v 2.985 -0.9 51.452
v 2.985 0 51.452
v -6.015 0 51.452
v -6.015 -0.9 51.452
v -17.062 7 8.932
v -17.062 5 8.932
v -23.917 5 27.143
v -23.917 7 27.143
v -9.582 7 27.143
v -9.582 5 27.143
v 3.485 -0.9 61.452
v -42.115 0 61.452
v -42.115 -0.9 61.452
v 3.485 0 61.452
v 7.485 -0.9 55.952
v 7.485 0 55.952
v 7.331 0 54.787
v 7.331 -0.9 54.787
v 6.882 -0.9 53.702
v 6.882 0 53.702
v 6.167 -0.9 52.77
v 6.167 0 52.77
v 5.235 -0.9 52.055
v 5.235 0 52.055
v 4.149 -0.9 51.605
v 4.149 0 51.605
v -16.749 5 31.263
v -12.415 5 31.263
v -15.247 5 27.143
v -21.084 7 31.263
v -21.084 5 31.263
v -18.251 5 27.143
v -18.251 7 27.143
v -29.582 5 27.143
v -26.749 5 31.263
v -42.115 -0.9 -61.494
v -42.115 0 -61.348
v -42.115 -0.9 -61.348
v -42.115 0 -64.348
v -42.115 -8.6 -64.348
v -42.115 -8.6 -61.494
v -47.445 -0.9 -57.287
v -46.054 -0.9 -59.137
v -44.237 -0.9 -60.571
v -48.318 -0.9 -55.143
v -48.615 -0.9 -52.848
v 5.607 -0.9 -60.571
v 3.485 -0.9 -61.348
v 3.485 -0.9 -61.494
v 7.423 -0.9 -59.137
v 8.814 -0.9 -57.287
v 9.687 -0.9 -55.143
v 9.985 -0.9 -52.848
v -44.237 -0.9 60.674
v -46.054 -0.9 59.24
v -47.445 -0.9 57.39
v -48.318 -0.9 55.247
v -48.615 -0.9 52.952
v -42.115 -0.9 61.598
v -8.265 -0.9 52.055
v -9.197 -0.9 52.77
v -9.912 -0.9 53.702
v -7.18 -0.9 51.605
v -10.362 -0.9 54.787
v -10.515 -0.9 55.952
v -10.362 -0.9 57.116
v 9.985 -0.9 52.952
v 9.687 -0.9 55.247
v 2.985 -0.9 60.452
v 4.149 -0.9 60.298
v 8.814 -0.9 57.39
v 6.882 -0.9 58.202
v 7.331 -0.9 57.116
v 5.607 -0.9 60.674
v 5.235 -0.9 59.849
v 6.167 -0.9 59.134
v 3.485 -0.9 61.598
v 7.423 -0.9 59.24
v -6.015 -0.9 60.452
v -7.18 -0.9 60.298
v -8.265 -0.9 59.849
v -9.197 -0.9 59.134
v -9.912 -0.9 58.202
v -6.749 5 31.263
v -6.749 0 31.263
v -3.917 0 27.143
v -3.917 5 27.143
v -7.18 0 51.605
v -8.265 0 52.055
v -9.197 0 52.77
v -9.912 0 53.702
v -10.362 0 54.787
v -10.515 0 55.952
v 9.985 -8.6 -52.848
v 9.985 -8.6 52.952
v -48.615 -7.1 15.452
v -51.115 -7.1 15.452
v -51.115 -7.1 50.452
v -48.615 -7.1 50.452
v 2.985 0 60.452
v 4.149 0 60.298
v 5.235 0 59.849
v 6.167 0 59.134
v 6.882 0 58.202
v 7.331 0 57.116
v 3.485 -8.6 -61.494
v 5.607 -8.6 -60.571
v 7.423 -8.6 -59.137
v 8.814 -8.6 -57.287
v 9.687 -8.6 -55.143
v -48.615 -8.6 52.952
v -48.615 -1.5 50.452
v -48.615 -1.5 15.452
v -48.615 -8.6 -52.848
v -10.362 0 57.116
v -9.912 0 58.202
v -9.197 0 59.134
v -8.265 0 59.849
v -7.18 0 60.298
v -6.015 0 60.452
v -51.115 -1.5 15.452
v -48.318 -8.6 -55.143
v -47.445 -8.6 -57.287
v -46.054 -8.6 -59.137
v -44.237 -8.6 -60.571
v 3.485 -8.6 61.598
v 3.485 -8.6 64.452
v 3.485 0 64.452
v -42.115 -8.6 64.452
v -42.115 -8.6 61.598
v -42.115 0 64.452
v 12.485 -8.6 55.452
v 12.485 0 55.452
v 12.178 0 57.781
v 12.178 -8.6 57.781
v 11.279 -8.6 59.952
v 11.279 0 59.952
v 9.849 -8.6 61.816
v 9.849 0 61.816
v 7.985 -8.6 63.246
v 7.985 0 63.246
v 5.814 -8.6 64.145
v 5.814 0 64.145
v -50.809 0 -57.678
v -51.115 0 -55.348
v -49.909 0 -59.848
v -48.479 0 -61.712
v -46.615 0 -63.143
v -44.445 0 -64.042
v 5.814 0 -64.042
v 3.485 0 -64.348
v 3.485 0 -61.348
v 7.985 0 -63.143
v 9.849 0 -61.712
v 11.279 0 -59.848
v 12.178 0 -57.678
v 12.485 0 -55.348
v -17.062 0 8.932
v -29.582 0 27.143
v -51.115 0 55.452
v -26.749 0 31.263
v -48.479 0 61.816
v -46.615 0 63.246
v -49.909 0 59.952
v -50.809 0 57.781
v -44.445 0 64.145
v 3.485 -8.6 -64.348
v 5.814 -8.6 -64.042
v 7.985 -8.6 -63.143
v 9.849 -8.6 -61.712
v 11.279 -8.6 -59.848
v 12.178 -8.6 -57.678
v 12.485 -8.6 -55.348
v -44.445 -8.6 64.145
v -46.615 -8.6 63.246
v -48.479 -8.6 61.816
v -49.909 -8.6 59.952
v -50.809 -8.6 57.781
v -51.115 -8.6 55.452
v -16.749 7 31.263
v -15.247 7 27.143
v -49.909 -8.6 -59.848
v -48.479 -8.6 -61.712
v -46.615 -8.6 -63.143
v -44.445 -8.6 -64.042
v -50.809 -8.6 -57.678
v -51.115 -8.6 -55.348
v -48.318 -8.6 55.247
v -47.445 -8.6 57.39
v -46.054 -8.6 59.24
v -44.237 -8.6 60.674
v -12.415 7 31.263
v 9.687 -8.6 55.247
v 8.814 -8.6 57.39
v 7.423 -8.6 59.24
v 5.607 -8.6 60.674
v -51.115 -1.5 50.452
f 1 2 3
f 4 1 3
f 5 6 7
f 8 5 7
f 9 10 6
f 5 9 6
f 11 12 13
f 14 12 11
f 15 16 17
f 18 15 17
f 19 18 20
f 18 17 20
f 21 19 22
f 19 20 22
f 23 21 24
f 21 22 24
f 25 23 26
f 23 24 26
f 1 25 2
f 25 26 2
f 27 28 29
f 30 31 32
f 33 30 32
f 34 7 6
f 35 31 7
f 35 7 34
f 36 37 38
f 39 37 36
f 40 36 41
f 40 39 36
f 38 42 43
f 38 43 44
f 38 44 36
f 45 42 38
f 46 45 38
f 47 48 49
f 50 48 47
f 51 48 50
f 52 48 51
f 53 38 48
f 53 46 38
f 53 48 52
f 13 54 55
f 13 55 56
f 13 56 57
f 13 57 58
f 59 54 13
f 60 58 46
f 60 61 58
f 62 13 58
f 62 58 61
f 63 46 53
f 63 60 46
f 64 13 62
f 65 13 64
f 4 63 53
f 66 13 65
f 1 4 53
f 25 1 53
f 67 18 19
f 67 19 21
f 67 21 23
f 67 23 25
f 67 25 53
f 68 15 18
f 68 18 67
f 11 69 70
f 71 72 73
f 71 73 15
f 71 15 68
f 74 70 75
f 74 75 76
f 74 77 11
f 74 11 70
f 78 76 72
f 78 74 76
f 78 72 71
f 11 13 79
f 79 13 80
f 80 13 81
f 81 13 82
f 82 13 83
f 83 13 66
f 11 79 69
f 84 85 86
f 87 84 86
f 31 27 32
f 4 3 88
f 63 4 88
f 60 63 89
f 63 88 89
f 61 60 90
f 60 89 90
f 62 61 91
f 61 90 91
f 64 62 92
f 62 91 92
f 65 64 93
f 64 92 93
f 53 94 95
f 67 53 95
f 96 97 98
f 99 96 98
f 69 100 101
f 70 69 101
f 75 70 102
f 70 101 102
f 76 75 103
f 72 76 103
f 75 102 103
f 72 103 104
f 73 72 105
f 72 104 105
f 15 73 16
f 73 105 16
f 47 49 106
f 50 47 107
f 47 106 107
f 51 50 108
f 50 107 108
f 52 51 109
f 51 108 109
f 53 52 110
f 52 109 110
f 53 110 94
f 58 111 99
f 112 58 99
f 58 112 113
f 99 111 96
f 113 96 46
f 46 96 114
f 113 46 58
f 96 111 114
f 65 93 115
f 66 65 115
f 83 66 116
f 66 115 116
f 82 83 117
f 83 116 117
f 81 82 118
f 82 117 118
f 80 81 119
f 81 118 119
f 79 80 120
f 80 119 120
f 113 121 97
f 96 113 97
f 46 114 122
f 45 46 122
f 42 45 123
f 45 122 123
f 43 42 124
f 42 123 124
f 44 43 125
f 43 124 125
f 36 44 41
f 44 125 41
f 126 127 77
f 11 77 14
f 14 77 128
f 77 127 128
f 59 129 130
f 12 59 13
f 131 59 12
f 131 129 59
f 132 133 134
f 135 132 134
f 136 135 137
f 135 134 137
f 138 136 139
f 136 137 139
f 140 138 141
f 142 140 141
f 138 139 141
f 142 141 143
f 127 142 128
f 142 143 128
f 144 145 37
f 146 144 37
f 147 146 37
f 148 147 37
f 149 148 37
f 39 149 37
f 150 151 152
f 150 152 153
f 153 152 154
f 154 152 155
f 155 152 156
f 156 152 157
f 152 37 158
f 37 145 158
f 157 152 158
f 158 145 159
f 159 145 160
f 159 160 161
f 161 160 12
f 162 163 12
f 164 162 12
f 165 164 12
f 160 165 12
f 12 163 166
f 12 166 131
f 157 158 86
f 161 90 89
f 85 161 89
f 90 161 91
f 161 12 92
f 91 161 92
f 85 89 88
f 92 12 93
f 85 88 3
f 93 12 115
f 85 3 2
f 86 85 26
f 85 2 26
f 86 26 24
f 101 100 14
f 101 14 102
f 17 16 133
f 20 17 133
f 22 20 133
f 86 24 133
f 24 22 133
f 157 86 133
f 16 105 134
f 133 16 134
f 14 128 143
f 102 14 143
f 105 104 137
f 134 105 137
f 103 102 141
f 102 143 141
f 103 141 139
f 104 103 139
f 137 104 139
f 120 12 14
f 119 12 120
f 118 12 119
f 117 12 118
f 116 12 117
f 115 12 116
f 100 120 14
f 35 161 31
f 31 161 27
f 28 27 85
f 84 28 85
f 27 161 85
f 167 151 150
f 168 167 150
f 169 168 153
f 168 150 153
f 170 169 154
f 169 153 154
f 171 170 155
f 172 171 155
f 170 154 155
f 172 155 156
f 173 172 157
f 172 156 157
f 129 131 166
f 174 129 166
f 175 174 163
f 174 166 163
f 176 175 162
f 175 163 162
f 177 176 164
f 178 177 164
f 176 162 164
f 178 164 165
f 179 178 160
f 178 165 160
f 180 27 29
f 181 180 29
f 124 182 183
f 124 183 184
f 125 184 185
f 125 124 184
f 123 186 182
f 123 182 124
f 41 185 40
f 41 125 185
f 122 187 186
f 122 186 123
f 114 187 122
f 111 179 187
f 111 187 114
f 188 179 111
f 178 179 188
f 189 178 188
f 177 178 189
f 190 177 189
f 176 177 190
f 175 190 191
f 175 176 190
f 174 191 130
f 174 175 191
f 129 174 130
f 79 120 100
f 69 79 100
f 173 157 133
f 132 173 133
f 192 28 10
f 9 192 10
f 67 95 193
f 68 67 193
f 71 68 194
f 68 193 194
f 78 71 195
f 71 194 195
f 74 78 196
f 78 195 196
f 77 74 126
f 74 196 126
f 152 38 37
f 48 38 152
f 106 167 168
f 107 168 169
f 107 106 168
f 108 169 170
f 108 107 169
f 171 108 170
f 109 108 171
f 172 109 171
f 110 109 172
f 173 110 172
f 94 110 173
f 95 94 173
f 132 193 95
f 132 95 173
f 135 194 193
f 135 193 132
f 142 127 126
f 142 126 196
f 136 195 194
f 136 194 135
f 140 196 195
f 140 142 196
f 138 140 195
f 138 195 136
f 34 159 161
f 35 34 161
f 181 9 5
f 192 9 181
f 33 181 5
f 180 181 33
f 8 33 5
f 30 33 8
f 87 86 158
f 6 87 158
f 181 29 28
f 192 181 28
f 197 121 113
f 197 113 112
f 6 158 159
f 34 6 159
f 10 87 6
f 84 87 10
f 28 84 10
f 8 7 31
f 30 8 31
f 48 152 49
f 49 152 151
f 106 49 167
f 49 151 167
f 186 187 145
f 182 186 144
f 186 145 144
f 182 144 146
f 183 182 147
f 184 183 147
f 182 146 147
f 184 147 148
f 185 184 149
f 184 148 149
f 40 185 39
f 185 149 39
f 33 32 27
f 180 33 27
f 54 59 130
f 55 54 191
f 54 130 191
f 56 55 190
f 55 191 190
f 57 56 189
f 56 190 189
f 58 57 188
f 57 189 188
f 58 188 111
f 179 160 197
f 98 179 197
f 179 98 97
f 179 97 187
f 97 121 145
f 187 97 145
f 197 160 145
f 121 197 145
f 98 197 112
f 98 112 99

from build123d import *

# Parameters (mm, degrees)
F1_DEPTH  = 8.6
F3_DEPTH  = 7.7
F5_DEPTH  = 5
F6_W      = 45.6
F6_H      = 8.6
F7_DEPTH  = 3
F8_W      = 5.6
F8_H      = 35
F9_DEPTH  = 14.2
F10_W     = 45.6
F10_H     = 8.6
F11_DEPTH = 3
F13_DEPTH = 5
F15_DEPTH = 2


with BuildPart() as f1:
    # F0 (on Front) → F1 (new body)
    with BuildSketch(Plane.XZ):
        with BuildLine():
            Line((3.4848013847, 64.4517231077), (-42.1151986153, 64.4517231077))
            ThreePointArc((-42.1151986153, 64.4517231077), (-48.479159646, 61.8156841384), (-51.1151986153, 55.4517231077))
            Line((-51.1151986153, 55.4517231077), (-51.1151986153, -55.3482768923))
            ThreePointArc((-51.1151986153, -55.3482768923), (-48.479159646, -61.712237923), (-42.1151986153, -64.3482768923))
            Line((-42.1151986153, -64.3482768923), (3.4848013847, -64.3482768923))
            ThreePointArc((3.4848013847, -64.3482768923), (9.8487624154, -61.712237923), (12.4848013847, -55.3482768923))
            Line((12.4848013847, -55.3482768923), (12.4848013847, 55.4517231077))
            ThreePointArc((12.4848013847, 55.4517231077), (9.8487624154, 61.8156841384), (3.4848013847, 64.4517231077))
        make_face()
    extrude(amount=F1_DEPTH)

    # F2 (on face) → F3 (cut)
    with BuildSketch(Plane.XZ.offset(8.6)):
        with BuildLine():
            Line((0.9848013847, 61.9517231077), (-39.6151986153, 61.9517231077))
            ThreePointArc((-39.6151986153, 61.9517231077), (-45.979159646, 59.3156841384), (-48.6151986153, 52.9517231077))
            Line((-48.6151986153, 52.9517231077), (-48.6151986153, -52.8482768923))
            ThreePointArc((-48.6151986153, -52.8482768923), (-45.979159646, -59.212237923), (-39.6151986153, -61.8482768923))
            Line((-39.6151986153, -61.8482768923), (0.9848013847, -61.8482768923))
            ThreePointArc((0.9848013847, -61.8482768923), (7.3487624154, -59.212237923), (9.9848013847, -52.8482768923))
            Line((9.9848013847, -52.8482768923), (9.9848013847, 52.9517231077))
            ThreePointArc((9.9848013847, 52.9517231077), (7.3487624154, 59.3156841384), (0.9848013847, 61.9517231077))
        make_face()
    extrude(amount=-F3_DEPTH, mode=Mode.SUBTRACT)

    # F4 (on face) → F5 (cut)
    with BuildSketch(Plane(origin=(0, 0, 0), x_dir=(-1, 0, 0), z_dir=(0, 1, 0))):
        with BuildLine():
            Line((6.0151986153, 60.4517231077), (-2.9848013847, 60.4517231077))
            ThreePointArc((-2.9848013847, 60.4517231077), (-6.1667819, 59.133703623), (-7.4848013847, 55.9517231077))
            ThreePointArc((-7.4848013847, 55.9517231077), (-6.1667819, 52.7697425924), (-2.9848013847, 51.4517231077))
            Line((-2.9848013847, 51.4517231077), (6.0151986153, 51.4517231077))
            ThreePointArc((6.0151986153, 51.4517231077), (9.1971791307, 52.7697425924), (10.5151986153, 55.9517231077))
            ThreePointArc((10.5151986153, 55.9517231077), (9.1971791307, 59.133703623), (6.0151986153, 60.4517231077))
        make_face()
    extrude(amount=-F5_DEPTH, mode=Mode.SUBTRACT)

    # F6 (on face) → F7 (cut)
    with BuildSketch(Plane(origin=(0, 0, -64.3482768923), x_dir=(1, 0, 0), z_dir=(0, 0, -1))):
        with Locations((-19.3151986153, 4.3)):
            Rectangle(F6_W, F6_H)
    extrude(amount=-F7_DEPTH, mode=Mode.SUBTRACT)

    # F8 (on face) → F9 (cut)
    with BuildSketch(Plane(origin=(-51.1151986153, 0, 0), x_dir=(0, -1, 0), z_dir=(-1, 0, 0))):
        with Locations((4.3, 32.9517231077)):
            Rectangle(F8_W, F8_H)
    extrude(amount=-F9_DEPTH, mode=Mode.SUBTRACT)

    # F10 (on face) → F11 (cut)
    with BuildSketch(Plane.XY.offset(64.4517231077)):
        with Locations((-19.3151986153, -4.3)):
            Rectangle(F10_W, F10_H)
    extrude(amount=-F11_DEPTH, mode=Mode.SUBTRACT)

    # F12 (on face) → F13 (join)
    with BuildSketch(Plane(origin=(0, 0, 0), x_dir=(-1, 0, 0), z_dir=(0, 1, 0))):
        Polygon((10.6879380899, 31.2634583622), (6.749325754, 31.2634583622), (3.9166819364, 27.1432485372), (7.8552942723, 27.1432485372), align=None)
        Polygon((13.5205856233, 27.1432485372), (10.6879380899, 31.2634583622), (7.8552942723, 27.1432485372), align=None)
        Polygon((16.3532294408, 31.2634583622), (10.6879380899, 31.2634583622), (13.5205856233, 27.1432485372), align=None)
        Polygon((7.8552942723, 27.1432485372), (3.9166819364, 27.1432485372), (17.0616876136, 8.9319211103), align=None)
        Polygon((19.2072947722, 27.1432485372), (16.3532294408, 31.2634583622), (13.5205856233, 27.1432485372), align=None)
        Polygon((22.0399385898, 31.2634583622), (16.3532294408, 31.2634583622), (19.2072947722, 27.1432485372), align=None)
        Polygon((13.5205856233, 27.1432485372), (7.8552942723, 27.1432485372), (17.0616876136, 8.9319211103), align=None)
        Polygon((19.2072947722, 27.1432485372), (13.5205856233, 27.1432485372), (17.0616876136, 8.9319211103), align=None)
        Polygon((24.8940039212, 27.1432485372), (17.0616876136, 8.9319211103), (29.5819732873, 27.1432485372), align=None)
        Polygon((19.2072947722, 27.1432485372), (17.0616876136, 8.9319211103), (24.8940039212, 27.1432485372), align=None)
        Polygon((24.8940039212, 27.1432485372), (22.0399385898, 31.2634583622), (19.2072947722, 27.1432485372), align=None)
        Polygon((26.749325754, 31.2634583622), (22.0399385898, 31.2634583622), (24.8940039212, 27.1432485372), (29.5819732873, 27.1432485372), align=None)
    extrude(amount=F13_DEPTH)

    # F14 (on face) → F15 (join)
    with BuildSketch(Plane(origin=(0, 5, 0), x_dir=(-1, 0, 0), z_dir=(0, 1, 0))):
        Polygon((12.4146133892, 31.2634583622), (9.5819695716, 27.1432485372), (15.2472572067, 27.1432485372), align=None)
        Polygon((15.2472572067, 27.1432485372), (9.5819695716, 27.1432485372), (17.0616876136, 8.9319211103), align=None)
        Polygon((16.749325754, 31.2634583622), (15.2472572067, 27.1432485372), (18.2513943012, 27.1432485372), align=None)
        Polygon((18.2513943012, 27.1432485372), (15.2472572067, 27.1432485372), (17.0616876136, 8.9319211103), align=None)
        Polygon((18.2513943012, 27.1432485372), (17.0616876136, 8.9319211103), (23.9166819364, 27.1432485372), align=None)
        Polygon((21.0840381188, 31.2634583622), (18.2513943012, 27.1432485372), (23.9166819364, 27.1432485372), align=None)
    extrude(amount=F15_DEPTH)


solid = f1.part
